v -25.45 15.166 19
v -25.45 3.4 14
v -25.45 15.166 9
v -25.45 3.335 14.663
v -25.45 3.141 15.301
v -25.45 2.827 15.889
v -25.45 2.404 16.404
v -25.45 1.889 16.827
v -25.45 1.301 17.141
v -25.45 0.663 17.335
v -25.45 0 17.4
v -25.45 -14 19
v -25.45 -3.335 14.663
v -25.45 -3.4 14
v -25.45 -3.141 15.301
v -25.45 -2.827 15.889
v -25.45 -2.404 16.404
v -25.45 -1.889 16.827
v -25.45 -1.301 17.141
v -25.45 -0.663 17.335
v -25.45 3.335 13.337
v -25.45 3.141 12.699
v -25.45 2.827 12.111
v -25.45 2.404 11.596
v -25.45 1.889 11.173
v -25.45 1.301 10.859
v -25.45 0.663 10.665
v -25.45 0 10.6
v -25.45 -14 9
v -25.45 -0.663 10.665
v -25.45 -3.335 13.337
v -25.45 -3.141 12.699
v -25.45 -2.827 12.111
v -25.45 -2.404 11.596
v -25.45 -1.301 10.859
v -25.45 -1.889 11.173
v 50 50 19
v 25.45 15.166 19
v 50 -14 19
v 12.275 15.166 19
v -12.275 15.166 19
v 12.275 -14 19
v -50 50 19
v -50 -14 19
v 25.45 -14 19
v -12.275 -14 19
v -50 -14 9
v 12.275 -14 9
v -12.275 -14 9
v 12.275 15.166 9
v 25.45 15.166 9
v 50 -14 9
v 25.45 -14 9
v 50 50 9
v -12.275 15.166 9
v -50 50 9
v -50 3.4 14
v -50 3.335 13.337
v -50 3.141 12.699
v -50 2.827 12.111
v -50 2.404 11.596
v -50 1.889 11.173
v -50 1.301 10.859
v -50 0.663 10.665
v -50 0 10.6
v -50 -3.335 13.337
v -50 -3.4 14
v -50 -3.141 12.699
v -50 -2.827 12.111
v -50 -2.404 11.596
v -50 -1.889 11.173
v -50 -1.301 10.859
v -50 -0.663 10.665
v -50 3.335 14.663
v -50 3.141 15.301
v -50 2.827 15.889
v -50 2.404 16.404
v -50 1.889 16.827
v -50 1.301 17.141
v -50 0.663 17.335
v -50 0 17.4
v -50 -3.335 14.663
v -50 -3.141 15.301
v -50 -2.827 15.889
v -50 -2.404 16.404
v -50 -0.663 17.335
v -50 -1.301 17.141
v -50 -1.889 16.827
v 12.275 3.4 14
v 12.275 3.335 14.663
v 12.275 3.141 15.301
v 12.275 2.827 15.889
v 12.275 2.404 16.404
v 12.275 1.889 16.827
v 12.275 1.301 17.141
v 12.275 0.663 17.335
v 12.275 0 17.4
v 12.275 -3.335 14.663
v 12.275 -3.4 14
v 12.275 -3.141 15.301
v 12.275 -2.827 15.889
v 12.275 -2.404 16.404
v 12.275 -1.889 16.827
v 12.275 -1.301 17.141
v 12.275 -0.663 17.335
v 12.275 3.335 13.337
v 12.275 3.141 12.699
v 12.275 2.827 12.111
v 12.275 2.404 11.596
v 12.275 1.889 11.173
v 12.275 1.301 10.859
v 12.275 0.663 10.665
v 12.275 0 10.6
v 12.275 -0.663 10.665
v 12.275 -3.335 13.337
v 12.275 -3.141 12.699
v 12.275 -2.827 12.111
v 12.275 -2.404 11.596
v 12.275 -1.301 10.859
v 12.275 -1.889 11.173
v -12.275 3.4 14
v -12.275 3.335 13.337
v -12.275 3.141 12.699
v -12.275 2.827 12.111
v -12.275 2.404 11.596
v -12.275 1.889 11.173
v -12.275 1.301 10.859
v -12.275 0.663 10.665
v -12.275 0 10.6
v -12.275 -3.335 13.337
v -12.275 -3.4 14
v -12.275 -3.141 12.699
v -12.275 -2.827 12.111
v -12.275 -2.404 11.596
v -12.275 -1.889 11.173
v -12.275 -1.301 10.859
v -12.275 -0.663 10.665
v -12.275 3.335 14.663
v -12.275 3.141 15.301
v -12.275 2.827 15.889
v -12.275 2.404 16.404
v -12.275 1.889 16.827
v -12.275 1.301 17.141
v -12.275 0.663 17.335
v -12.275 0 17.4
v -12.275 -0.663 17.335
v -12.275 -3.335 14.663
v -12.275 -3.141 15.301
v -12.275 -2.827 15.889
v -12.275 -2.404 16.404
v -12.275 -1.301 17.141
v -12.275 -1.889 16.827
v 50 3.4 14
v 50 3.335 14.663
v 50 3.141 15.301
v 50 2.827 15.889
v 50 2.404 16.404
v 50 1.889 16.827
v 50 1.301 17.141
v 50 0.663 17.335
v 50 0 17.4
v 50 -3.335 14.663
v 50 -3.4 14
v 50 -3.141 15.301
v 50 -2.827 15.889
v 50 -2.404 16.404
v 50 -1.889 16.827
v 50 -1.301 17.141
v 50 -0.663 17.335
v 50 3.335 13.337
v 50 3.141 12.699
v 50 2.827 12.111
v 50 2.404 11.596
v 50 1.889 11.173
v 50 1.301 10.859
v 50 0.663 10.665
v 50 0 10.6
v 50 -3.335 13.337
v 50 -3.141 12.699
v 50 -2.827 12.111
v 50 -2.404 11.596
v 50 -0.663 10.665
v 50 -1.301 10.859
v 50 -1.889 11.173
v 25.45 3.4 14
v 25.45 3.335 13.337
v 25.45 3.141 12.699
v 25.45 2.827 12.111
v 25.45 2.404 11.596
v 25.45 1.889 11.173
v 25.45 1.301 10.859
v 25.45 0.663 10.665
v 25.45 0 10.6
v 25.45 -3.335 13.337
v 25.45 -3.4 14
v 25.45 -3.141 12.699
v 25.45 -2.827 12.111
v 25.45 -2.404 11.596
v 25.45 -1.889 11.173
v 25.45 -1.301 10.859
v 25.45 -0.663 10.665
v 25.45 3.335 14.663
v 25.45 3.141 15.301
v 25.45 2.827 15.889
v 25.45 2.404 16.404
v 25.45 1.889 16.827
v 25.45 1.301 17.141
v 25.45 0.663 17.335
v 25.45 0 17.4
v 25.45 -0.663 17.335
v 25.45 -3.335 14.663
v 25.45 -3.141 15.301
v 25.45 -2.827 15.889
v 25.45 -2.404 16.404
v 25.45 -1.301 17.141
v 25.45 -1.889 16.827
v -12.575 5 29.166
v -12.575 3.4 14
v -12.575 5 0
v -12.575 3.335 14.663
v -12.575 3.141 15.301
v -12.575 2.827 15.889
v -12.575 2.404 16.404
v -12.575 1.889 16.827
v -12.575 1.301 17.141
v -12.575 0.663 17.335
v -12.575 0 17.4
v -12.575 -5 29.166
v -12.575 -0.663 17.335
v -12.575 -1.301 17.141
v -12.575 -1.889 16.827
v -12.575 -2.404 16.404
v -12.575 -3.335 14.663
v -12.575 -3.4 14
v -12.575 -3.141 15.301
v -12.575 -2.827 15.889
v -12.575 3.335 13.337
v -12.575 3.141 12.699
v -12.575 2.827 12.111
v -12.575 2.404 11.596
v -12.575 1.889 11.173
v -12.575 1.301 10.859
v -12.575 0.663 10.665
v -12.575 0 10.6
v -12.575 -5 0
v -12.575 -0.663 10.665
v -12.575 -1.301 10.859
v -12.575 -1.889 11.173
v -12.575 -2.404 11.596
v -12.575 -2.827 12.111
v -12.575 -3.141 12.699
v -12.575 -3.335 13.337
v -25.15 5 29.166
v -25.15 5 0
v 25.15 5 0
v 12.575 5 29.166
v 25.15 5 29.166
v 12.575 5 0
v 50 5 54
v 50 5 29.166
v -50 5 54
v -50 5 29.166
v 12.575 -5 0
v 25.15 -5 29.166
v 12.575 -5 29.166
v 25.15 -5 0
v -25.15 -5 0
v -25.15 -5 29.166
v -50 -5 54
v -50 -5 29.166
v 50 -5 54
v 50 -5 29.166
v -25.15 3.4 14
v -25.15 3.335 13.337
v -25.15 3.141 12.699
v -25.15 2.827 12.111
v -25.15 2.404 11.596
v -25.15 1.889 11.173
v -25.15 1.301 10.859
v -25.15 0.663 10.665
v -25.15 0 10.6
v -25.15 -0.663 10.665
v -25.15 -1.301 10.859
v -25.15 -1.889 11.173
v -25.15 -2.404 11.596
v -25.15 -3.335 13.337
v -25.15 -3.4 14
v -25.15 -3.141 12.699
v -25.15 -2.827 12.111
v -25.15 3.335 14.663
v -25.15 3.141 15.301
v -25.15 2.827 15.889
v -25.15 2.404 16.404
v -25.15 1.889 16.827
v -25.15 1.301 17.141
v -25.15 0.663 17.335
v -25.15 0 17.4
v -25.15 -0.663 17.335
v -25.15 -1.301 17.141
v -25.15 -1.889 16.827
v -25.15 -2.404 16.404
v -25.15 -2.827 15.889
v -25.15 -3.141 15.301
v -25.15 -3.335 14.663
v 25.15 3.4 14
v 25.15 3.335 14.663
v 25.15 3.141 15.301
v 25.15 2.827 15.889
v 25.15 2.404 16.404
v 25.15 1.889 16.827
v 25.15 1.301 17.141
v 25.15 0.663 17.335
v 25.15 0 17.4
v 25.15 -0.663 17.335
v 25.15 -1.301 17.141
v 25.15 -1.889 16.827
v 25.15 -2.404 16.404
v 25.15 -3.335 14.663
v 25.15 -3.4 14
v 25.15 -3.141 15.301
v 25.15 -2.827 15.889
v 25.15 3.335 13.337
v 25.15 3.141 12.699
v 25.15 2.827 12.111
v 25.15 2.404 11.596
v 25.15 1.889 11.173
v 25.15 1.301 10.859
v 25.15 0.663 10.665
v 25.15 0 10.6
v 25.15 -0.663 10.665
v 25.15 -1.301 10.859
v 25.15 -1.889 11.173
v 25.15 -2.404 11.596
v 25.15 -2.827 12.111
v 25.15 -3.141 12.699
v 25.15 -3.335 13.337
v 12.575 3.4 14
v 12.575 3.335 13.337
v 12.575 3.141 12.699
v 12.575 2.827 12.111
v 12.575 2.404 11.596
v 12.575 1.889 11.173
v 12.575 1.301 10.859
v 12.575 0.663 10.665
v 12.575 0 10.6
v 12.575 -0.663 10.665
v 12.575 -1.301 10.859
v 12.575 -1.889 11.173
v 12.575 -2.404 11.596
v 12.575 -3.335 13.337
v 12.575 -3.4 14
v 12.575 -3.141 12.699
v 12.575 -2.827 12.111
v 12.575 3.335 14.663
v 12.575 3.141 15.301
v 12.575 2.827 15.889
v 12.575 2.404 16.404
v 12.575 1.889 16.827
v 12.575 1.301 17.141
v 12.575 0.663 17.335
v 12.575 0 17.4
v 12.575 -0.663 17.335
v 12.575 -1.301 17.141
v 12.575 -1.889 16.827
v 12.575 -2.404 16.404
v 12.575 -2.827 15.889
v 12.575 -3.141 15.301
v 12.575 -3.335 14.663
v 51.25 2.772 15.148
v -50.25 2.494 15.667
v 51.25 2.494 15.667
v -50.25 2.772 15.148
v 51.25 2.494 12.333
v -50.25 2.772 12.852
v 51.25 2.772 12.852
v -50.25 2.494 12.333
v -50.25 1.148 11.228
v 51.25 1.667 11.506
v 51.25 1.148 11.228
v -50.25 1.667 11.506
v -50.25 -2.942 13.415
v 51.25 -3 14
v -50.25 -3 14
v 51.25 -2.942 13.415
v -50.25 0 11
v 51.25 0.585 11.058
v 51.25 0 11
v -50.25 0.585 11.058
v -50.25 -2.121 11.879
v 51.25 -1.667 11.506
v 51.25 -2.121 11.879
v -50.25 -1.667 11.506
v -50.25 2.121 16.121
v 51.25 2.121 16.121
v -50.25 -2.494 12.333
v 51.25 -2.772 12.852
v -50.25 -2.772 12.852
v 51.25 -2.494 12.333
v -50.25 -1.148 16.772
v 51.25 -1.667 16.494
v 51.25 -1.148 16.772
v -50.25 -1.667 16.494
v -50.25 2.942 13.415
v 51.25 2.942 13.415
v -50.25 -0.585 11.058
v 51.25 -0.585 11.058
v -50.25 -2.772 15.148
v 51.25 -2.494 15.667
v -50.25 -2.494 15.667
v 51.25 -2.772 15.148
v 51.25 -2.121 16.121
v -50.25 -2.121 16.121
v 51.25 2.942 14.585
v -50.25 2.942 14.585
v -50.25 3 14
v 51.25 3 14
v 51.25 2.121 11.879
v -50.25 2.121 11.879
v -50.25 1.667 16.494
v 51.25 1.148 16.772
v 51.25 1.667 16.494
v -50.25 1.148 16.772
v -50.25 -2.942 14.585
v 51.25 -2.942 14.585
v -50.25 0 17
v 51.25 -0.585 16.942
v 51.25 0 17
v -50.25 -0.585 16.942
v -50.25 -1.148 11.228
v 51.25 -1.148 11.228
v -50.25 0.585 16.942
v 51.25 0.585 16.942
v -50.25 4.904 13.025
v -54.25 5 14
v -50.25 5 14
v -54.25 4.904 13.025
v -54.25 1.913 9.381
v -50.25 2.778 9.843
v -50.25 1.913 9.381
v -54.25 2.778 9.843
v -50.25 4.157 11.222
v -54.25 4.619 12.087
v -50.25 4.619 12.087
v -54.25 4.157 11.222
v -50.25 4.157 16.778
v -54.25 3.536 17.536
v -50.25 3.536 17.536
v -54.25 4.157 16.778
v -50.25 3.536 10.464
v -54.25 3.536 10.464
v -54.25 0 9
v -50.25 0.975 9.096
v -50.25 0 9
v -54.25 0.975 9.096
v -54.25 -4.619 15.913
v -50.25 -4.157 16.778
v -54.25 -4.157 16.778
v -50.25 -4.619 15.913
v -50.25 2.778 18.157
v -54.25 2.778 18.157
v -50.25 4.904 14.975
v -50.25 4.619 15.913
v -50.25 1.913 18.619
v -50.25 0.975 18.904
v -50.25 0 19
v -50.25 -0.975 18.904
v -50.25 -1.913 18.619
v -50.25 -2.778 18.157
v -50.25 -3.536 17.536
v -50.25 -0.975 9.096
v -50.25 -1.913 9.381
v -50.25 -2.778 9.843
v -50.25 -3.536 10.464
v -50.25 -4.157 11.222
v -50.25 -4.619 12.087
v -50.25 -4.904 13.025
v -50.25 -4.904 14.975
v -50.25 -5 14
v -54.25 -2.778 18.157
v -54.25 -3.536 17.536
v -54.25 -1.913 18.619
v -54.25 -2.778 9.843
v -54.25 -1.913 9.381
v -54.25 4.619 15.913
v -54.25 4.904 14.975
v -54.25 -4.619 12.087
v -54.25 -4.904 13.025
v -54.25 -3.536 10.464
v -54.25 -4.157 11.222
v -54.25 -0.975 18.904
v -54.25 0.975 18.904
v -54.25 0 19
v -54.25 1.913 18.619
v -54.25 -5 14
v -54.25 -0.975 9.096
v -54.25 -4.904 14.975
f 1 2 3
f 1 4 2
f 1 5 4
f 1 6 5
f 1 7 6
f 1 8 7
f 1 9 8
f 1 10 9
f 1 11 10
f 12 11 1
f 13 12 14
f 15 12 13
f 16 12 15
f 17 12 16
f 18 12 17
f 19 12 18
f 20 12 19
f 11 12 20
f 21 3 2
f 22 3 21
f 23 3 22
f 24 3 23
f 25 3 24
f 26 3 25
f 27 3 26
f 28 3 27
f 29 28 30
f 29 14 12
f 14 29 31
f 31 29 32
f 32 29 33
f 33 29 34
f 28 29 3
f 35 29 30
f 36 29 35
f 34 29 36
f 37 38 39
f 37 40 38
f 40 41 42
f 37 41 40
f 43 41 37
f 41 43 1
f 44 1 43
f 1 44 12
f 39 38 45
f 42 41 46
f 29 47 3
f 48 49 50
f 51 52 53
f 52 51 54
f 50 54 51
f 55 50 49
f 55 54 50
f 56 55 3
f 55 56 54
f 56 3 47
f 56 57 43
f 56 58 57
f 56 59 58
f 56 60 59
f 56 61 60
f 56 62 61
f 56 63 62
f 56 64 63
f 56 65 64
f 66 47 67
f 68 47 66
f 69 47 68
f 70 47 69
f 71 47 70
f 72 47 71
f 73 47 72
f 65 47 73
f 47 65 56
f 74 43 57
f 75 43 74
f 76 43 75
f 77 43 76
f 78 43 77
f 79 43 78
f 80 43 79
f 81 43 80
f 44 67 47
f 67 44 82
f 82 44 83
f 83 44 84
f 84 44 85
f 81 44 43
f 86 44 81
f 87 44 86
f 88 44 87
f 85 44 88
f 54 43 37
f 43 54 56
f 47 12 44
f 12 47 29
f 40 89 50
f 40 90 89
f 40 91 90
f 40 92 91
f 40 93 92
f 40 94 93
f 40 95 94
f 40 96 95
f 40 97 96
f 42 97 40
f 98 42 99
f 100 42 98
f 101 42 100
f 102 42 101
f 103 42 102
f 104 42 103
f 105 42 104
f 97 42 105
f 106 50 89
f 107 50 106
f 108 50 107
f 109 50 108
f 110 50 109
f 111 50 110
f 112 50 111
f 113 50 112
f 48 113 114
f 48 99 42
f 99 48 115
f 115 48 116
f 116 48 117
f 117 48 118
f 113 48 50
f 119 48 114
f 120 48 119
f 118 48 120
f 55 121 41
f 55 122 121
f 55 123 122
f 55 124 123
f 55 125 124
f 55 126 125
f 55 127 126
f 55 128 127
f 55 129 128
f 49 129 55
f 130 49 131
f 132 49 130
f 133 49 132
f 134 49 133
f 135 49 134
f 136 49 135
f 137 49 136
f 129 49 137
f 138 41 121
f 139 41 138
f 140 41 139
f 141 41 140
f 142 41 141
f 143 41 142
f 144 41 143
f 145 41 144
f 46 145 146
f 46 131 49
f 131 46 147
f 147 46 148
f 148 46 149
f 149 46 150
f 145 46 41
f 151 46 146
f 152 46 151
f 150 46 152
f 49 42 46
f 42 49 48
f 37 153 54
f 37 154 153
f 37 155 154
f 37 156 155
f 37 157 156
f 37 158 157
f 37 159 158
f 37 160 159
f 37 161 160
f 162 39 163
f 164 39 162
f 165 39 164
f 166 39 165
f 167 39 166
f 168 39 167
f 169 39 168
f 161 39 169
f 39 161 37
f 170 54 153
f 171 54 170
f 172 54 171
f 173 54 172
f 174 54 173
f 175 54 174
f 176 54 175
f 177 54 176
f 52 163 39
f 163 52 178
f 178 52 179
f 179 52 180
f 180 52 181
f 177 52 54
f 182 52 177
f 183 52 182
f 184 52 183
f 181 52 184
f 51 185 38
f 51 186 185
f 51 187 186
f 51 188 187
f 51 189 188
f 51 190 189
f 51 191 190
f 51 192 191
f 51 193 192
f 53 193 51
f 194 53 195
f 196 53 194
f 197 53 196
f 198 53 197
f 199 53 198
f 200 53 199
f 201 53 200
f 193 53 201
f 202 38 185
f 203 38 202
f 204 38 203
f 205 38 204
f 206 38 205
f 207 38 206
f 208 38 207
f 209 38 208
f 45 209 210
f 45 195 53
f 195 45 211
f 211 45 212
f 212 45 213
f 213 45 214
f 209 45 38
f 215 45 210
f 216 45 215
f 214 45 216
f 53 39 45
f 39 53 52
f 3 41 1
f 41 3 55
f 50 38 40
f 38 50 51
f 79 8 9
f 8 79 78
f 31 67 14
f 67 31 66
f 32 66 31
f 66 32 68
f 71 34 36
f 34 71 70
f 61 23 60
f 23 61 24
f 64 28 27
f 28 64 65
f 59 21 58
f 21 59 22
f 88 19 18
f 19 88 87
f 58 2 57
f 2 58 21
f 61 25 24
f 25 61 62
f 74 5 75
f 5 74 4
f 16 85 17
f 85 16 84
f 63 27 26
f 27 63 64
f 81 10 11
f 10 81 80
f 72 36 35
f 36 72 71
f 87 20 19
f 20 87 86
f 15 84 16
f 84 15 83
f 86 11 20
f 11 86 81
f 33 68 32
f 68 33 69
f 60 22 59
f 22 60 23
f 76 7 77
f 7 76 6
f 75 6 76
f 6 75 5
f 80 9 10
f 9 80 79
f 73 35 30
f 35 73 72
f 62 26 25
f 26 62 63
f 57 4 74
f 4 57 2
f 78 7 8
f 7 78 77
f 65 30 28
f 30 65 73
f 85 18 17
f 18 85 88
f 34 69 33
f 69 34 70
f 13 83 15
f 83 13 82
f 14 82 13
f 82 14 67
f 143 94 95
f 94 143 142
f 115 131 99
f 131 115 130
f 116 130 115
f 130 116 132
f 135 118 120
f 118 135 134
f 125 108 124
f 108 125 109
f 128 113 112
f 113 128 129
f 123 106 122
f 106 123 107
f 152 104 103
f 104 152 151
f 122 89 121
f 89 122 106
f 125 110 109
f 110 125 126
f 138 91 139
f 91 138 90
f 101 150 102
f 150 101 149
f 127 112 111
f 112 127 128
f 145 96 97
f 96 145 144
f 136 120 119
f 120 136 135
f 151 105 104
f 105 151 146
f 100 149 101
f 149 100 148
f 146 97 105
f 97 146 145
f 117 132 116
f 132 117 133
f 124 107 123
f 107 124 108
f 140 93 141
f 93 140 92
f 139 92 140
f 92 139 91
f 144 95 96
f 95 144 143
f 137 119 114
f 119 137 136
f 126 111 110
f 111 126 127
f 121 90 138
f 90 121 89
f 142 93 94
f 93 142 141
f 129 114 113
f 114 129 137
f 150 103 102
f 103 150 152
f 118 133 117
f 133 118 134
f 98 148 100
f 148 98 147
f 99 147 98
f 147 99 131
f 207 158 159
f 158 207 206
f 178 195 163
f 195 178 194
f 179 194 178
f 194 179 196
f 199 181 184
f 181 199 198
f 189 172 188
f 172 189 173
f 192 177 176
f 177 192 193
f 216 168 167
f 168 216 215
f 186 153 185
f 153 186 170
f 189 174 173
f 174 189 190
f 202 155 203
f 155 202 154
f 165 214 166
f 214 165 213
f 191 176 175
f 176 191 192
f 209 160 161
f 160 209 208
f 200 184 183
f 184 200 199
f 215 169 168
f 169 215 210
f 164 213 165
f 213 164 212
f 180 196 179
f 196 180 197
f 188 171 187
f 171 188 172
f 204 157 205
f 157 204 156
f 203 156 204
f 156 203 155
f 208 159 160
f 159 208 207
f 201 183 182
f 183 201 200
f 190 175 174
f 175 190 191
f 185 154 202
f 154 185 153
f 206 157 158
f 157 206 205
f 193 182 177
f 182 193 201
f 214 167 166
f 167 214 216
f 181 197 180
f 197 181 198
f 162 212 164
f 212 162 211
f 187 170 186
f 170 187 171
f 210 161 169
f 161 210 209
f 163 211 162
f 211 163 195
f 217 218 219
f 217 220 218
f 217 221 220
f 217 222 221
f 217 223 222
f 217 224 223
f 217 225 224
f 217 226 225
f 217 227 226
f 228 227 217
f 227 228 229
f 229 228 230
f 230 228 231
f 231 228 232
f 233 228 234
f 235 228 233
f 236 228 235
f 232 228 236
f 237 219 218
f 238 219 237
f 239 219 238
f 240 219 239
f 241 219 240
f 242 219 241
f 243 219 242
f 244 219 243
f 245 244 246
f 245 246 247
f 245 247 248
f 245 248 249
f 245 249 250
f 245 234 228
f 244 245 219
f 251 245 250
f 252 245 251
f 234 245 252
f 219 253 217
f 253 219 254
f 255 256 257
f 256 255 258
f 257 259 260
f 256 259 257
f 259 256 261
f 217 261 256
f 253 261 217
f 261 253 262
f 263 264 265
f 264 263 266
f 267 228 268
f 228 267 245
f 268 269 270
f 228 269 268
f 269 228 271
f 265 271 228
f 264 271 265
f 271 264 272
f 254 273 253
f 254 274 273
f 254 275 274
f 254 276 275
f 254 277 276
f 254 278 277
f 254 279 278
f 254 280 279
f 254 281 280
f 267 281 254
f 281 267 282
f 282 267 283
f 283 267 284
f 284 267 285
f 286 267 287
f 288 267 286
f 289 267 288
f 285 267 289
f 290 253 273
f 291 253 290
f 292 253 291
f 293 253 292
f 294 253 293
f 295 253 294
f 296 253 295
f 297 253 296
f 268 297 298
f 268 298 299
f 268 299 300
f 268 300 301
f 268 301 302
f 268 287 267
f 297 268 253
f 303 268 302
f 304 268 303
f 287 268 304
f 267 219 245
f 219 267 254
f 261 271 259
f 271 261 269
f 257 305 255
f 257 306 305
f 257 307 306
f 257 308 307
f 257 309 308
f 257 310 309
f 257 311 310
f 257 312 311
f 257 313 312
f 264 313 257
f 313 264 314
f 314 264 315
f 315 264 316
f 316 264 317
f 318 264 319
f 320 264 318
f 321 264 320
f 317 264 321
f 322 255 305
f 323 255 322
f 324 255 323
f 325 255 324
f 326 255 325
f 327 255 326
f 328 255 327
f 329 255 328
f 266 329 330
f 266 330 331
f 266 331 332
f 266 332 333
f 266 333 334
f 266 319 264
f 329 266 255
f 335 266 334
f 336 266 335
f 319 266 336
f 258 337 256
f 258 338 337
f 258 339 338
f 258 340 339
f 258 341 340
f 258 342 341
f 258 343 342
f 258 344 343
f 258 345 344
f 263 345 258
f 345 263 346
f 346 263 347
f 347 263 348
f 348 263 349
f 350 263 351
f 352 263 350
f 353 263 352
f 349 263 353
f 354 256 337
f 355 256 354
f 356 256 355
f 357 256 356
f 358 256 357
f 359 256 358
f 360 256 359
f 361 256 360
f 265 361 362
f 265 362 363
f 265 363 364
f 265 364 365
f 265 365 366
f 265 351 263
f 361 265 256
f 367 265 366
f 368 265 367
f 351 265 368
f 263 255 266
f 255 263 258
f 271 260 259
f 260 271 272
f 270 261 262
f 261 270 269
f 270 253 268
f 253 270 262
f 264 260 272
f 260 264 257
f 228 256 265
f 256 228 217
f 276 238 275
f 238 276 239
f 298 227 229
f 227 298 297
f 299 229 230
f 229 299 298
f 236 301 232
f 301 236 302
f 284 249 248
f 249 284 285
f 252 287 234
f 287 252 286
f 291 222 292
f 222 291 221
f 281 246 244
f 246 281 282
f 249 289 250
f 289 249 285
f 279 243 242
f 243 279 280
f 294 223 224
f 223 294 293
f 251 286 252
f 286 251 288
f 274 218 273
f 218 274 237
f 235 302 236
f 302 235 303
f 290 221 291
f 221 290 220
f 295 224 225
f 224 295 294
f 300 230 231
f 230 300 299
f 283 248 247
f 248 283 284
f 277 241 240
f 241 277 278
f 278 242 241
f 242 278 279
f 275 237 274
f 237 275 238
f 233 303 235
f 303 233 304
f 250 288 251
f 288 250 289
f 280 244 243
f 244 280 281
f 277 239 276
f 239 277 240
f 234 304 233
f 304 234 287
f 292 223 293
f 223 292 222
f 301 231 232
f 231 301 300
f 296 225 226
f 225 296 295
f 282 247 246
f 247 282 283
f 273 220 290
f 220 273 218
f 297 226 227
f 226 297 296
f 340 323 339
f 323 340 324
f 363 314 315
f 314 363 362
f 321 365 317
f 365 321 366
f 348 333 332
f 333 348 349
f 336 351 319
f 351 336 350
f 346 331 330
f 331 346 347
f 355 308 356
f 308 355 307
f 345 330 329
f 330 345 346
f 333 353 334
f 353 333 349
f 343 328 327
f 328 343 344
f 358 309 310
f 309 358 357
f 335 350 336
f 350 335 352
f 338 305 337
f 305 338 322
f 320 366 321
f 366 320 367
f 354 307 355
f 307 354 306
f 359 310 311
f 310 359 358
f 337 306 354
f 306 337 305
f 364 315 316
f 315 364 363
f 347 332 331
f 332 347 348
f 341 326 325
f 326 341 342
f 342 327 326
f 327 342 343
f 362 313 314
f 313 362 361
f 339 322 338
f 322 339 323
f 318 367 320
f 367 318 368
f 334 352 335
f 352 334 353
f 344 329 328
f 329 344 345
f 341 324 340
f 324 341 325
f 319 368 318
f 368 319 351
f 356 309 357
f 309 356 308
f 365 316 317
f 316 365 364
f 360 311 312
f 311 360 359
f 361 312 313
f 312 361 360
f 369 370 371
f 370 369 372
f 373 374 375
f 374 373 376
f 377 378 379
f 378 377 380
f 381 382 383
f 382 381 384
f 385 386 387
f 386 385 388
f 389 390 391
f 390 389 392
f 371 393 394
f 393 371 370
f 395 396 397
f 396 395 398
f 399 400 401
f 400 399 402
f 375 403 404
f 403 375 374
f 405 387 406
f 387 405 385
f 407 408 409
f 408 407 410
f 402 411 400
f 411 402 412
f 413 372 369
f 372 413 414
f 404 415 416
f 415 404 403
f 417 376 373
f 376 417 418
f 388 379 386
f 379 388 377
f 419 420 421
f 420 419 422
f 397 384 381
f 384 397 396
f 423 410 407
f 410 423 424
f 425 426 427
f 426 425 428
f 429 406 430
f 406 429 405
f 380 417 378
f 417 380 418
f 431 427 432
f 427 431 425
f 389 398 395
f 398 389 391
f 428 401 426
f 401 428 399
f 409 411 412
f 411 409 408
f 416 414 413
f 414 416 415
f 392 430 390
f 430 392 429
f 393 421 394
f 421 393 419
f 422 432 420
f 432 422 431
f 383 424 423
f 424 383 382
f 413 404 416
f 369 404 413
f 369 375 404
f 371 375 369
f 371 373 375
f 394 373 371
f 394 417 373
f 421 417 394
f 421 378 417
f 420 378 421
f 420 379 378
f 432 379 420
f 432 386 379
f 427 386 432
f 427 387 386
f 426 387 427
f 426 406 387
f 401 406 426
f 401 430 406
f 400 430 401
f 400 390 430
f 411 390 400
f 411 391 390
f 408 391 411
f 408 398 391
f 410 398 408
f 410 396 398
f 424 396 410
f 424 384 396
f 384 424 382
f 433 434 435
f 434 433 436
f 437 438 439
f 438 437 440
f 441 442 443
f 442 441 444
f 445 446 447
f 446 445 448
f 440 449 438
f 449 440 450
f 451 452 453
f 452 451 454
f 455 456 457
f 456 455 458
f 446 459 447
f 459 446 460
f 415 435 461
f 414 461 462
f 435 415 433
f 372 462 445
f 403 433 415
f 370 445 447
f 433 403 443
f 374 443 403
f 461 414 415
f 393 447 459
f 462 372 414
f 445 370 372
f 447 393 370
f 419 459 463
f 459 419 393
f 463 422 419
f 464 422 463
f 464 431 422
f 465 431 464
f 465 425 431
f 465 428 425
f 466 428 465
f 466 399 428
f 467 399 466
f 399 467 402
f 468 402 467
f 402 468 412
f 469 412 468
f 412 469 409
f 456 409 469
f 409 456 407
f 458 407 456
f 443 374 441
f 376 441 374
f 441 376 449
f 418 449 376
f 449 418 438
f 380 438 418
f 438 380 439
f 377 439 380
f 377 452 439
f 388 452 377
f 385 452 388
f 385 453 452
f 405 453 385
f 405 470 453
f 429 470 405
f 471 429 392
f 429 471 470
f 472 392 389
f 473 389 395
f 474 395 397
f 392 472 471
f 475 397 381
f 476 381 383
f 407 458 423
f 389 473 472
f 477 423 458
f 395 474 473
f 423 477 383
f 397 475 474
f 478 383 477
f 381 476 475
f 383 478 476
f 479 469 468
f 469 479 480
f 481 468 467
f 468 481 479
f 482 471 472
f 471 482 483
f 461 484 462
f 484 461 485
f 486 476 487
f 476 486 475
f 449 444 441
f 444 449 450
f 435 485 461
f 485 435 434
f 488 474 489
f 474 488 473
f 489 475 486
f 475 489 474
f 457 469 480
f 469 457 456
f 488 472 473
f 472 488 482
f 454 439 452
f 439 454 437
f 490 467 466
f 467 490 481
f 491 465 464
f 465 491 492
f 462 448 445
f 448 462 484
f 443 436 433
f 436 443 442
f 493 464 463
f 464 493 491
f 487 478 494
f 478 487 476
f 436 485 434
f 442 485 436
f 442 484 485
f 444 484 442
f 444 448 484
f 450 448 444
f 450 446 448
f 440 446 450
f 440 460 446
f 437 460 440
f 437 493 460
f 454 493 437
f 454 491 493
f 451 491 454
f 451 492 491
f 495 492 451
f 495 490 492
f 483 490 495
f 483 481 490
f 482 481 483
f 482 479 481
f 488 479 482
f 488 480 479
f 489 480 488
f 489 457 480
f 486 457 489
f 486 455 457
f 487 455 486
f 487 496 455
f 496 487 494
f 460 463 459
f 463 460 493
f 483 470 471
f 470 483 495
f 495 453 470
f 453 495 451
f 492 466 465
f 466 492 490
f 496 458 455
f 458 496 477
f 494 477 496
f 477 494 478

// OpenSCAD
$fn = 32;

// ------------------------------------------------------------------------
// Butt hinge: hinge 100 mm, leaf swung 270 deg
// Every part is its own module, assembly() places every instance.
// ------------------------------------------------------------------------

// --- part 1 ---
module hinge_base() {
  difference() {
    union() {
      translate([-50, -14, -5]) cube([24.55, 64, 10]);
      translate([-12.275, -14, -5]) cube([24.55, 64, 10]);
      translate([25.45, -14, -5]) cube([24.55, 64, 10]);
      translate([-50, 15.166, -5]) cube([100, 34.834, 10]);
    }
    translate([-37.725, 0, 0]) rotate([0, 90, 0]) cylinder(h = 26.55, d = 6.8, center = true);
    translate([0, 0, 0]) rotate([0, 90, 0]) cylinder(h = 26.55, d = 6.8, center = true);
    translate([37.725, 0, 0]) rotate([0, 90, 0]) cylinder(h = 26.55, d = 6.8, center = true);
  }
}

// --- part 2 ---
module hinge_mover() {
  difference() {
    union() {
      translate([-25.15, -40, -5]) cube([12.575, 54, 10]);
      translate([12.575, -40, -5]) cube([12.575, 54, 10]);
      translate([-50, -40, -5]) cube([100, 24.834, 10]);
    }
    translate([-18.863, 0, 0]) rotate([0, 90, 0]) cylinder(h = 14.575, d = 6.8, center = true);
    translate([18.863, 0, 0]) rotate([0, 90, 0]) cylinder(h = 14.575, d = 6.8, center = true);
  }
}

// --- part 3 ---
module hinge_pin() {
  rotate([0, 90, 0]) cylinder(h = 102.5, d = 6, center = true);
  translate([-54.25, 0, 0]) rotate([0, 90, 0]) cylinder(h = 4, d = 10);
}

// --- assembly ---
module assembly() {
  color([0.80, 0.24, 0.20]) translate([0, 0, 14]) rotate([0, 0, 0]) hinge_base();
  color([0.20, 0.45, 0.75]) translate([0, 0, 14]) rotate([270, 0, 0]) hinge_mover();
  color([0.25, 0.62, 0.32]) translate([0, 0, 14]) rotate([0, 0, 0]) hinge_pin();
}

assembly();
